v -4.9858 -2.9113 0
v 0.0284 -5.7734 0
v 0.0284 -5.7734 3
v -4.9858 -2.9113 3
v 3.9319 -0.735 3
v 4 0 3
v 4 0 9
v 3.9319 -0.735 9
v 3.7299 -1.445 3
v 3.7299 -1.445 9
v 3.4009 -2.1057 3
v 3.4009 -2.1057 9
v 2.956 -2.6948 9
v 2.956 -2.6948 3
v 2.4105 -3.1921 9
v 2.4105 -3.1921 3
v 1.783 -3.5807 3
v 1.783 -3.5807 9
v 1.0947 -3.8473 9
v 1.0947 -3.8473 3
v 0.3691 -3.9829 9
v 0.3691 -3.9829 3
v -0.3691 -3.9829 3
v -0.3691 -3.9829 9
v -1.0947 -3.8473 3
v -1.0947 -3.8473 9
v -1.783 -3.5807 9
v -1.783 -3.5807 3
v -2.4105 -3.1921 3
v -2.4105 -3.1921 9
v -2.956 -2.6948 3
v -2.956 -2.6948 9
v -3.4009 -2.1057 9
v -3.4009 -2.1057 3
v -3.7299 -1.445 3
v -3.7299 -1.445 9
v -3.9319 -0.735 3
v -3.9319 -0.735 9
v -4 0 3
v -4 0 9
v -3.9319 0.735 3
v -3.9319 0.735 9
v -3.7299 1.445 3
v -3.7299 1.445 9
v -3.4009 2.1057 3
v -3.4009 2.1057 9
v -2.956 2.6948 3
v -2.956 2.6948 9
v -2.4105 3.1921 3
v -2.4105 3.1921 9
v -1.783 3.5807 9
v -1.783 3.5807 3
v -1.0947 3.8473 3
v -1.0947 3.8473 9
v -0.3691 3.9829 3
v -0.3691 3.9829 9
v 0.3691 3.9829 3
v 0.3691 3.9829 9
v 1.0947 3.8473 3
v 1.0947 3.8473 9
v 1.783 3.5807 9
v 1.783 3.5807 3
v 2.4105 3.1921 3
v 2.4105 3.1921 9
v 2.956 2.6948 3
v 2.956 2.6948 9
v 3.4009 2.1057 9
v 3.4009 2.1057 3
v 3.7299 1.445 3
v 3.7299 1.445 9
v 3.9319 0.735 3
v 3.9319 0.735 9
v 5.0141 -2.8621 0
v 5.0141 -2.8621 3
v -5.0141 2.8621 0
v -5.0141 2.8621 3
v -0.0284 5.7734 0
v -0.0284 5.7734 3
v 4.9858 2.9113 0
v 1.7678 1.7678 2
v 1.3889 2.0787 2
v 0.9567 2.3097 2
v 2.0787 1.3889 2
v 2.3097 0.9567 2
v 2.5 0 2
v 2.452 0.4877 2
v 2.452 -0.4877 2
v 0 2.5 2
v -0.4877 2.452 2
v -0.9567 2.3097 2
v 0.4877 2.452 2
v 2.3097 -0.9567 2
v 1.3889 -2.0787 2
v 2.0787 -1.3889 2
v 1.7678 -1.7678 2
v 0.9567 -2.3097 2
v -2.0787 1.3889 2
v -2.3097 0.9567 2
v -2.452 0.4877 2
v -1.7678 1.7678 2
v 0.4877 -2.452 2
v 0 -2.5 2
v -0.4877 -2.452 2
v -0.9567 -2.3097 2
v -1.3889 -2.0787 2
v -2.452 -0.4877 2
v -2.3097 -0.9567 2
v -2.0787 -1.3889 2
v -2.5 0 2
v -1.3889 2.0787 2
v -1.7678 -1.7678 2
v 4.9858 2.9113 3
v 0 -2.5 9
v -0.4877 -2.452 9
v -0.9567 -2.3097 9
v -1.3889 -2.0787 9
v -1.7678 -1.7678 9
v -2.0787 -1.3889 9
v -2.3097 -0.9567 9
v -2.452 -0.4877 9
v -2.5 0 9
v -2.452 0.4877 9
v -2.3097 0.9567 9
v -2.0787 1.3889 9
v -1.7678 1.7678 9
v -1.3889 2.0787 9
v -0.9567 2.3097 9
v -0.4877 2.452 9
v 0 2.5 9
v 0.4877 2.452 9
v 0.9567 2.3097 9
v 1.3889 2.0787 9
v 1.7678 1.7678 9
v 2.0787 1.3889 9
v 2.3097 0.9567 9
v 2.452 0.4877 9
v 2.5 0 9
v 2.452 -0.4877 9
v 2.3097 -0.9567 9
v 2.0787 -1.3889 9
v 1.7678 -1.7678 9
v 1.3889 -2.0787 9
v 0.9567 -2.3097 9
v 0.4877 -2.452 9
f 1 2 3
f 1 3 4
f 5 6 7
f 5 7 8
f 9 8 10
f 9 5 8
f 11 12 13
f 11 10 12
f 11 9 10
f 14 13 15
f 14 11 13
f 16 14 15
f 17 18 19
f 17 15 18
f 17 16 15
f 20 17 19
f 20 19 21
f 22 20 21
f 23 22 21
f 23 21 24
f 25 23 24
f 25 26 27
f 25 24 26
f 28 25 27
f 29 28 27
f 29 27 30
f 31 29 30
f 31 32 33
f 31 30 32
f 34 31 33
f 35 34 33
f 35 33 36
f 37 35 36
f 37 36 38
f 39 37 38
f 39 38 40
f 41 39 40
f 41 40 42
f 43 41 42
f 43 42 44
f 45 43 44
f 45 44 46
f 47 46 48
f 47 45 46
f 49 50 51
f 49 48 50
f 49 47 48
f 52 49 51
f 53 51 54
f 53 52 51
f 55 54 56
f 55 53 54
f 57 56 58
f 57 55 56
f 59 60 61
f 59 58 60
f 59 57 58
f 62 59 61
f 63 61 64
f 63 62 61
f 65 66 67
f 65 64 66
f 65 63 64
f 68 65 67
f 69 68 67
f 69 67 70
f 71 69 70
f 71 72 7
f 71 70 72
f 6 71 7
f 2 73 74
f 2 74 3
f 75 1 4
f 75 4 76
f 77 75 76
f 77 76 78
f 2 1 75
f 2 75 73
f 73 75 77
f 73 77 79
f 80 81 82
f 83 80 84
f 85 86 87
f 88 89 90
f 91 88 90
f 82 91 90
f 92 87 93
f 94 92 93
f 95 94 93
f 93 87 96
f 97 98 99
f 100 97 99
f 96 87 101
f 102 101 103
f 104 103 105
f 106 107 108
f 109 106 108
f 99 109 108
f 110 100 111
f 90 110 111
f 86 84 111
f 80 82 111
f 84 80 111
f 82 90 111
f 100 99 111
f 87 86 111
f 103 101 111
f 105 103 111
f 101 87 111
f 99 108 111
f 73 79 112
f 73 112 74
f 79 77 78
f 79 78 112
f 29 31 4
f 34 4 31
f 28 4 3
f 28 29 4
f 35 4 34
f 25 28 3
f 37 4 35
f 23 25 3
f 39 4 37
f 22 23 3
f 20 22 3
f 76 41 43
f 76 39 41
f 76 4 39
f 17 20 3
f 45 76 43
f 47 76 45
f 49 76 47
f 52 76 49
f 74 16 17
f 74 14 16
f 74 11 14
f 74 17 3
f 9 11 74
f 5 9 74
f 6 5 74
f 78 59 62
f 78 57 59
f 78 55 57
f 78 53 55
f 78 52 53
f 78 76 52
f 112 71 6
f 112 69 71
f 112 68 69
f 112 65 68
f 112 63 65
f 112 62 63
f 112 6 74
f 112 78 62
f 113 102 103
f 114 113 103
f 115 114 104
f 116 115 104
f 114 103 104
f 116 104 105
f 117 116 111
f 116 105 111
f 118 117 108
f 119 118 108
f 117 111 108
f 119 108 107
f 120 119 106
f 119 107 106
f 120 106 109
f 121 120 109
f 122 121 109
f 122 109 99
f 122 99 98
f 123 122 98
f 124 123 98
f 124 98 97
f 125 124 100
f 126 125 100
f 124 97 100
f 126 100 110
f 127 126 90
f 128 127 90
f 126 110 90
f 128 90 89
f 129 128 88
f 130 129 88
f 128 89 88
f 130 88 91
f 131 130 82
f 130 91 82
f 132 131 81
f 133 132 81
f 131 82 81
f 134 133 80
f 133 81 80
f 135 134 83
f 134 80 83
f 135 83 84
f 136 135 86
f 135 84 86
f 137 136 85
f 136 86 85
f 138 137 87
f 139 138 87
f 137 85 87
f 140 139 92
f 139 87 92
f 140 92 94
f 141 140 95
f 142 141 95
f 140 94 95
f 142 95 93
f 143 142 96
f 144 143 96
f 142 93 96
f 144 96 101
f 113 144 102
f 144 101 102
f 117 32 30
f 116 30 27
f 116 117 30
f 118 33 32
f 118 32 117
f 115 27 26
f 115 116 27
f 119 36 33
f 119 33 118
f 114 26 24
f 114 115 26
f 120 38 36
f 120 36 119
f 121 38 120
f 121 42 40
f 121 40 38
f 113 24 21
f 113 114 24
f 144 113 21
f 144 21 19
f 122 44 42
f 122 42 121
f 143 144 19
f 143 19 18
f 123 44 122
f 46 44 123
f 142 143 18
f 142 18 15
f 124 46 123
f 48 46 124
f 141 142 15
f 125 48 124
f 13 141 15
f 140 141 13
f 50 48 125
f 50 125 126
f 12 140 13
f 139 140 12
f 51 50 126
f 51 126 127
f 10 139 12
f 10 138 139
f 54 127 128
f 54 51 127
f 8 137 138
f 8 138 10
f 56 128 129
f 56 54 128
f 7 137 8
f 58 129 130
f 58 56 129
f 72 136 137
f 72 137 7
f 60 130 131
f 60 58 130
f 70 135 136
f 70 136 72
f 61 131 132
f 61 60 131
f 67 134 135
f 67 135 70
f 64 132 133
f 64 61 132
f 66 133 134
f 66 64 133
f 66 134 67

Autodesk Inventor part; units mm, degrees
ref_plane "YZ Plane" through (0, 0, 0) normal (1, 0, 0) x (0, 1, 0)
ref_plane "XZ Plane" through (0, 0, 0) normal (0, 1, 0) x (-1, 0, 0)
ref_plane "XY Plane" through (0, 0, 0) normal (0, 0, 1) x (1, 0, 0)
sketch "Boceto1" plane through (0, 0, 0) normal (0, 0, 1) x (1, 0, 0)
  line L0 (5.0141, -2.8621) -> (0.0284, -5.7734)
  line L1 (0.0284, -5.7734) -> (-4.9858, -2.9113)
  line L2 (-4.9858, -2.9113) -> (-5.0141, 2.8621)
  line L3 (-5.0141, 2.8621) -> (-0.0284, 5.7734)
  line L4 (-0.0284, 5.7734) -> (4.9858, 2.9113)
  line L5 (4.9858, 2.9113) -> (5.0141, -2.8621)
  point P0 (0, 0)
  point P1 (0, 0)
  dimension "d0" = 10
extrude "Extrusión1" add sketch "Boceto1" along normal blind 3
sketch "Boceto2" plane through (0, 0, 3) normal (0, 0, 1) x (1, 0, 0)
  circle A0 centre (0, 0) radius 4
  circle A1 centre (0, 0) radius 2.5
  dimension "d3" = 8
  dimension "d4" = 5
extrude "Extrusión2" add sketch "Boceto2" along normal blind 6 contours A0 | A1
sketch "Boceto3" plane through (0, 0, 9) normal (0, 0, 1) x (1, 0, 0)
  point P0 (0, 0)
  point P1 (0, 0)
hole "Agujero1" at (0, 0, 9) direction (0, 0, -1) diameter 5 depth 7
thread "Rosca1" size "M8x1.25" class "6g" standard "ANSI Metric M Profile" length 18.5
properties part number "Hudson 1-57"
